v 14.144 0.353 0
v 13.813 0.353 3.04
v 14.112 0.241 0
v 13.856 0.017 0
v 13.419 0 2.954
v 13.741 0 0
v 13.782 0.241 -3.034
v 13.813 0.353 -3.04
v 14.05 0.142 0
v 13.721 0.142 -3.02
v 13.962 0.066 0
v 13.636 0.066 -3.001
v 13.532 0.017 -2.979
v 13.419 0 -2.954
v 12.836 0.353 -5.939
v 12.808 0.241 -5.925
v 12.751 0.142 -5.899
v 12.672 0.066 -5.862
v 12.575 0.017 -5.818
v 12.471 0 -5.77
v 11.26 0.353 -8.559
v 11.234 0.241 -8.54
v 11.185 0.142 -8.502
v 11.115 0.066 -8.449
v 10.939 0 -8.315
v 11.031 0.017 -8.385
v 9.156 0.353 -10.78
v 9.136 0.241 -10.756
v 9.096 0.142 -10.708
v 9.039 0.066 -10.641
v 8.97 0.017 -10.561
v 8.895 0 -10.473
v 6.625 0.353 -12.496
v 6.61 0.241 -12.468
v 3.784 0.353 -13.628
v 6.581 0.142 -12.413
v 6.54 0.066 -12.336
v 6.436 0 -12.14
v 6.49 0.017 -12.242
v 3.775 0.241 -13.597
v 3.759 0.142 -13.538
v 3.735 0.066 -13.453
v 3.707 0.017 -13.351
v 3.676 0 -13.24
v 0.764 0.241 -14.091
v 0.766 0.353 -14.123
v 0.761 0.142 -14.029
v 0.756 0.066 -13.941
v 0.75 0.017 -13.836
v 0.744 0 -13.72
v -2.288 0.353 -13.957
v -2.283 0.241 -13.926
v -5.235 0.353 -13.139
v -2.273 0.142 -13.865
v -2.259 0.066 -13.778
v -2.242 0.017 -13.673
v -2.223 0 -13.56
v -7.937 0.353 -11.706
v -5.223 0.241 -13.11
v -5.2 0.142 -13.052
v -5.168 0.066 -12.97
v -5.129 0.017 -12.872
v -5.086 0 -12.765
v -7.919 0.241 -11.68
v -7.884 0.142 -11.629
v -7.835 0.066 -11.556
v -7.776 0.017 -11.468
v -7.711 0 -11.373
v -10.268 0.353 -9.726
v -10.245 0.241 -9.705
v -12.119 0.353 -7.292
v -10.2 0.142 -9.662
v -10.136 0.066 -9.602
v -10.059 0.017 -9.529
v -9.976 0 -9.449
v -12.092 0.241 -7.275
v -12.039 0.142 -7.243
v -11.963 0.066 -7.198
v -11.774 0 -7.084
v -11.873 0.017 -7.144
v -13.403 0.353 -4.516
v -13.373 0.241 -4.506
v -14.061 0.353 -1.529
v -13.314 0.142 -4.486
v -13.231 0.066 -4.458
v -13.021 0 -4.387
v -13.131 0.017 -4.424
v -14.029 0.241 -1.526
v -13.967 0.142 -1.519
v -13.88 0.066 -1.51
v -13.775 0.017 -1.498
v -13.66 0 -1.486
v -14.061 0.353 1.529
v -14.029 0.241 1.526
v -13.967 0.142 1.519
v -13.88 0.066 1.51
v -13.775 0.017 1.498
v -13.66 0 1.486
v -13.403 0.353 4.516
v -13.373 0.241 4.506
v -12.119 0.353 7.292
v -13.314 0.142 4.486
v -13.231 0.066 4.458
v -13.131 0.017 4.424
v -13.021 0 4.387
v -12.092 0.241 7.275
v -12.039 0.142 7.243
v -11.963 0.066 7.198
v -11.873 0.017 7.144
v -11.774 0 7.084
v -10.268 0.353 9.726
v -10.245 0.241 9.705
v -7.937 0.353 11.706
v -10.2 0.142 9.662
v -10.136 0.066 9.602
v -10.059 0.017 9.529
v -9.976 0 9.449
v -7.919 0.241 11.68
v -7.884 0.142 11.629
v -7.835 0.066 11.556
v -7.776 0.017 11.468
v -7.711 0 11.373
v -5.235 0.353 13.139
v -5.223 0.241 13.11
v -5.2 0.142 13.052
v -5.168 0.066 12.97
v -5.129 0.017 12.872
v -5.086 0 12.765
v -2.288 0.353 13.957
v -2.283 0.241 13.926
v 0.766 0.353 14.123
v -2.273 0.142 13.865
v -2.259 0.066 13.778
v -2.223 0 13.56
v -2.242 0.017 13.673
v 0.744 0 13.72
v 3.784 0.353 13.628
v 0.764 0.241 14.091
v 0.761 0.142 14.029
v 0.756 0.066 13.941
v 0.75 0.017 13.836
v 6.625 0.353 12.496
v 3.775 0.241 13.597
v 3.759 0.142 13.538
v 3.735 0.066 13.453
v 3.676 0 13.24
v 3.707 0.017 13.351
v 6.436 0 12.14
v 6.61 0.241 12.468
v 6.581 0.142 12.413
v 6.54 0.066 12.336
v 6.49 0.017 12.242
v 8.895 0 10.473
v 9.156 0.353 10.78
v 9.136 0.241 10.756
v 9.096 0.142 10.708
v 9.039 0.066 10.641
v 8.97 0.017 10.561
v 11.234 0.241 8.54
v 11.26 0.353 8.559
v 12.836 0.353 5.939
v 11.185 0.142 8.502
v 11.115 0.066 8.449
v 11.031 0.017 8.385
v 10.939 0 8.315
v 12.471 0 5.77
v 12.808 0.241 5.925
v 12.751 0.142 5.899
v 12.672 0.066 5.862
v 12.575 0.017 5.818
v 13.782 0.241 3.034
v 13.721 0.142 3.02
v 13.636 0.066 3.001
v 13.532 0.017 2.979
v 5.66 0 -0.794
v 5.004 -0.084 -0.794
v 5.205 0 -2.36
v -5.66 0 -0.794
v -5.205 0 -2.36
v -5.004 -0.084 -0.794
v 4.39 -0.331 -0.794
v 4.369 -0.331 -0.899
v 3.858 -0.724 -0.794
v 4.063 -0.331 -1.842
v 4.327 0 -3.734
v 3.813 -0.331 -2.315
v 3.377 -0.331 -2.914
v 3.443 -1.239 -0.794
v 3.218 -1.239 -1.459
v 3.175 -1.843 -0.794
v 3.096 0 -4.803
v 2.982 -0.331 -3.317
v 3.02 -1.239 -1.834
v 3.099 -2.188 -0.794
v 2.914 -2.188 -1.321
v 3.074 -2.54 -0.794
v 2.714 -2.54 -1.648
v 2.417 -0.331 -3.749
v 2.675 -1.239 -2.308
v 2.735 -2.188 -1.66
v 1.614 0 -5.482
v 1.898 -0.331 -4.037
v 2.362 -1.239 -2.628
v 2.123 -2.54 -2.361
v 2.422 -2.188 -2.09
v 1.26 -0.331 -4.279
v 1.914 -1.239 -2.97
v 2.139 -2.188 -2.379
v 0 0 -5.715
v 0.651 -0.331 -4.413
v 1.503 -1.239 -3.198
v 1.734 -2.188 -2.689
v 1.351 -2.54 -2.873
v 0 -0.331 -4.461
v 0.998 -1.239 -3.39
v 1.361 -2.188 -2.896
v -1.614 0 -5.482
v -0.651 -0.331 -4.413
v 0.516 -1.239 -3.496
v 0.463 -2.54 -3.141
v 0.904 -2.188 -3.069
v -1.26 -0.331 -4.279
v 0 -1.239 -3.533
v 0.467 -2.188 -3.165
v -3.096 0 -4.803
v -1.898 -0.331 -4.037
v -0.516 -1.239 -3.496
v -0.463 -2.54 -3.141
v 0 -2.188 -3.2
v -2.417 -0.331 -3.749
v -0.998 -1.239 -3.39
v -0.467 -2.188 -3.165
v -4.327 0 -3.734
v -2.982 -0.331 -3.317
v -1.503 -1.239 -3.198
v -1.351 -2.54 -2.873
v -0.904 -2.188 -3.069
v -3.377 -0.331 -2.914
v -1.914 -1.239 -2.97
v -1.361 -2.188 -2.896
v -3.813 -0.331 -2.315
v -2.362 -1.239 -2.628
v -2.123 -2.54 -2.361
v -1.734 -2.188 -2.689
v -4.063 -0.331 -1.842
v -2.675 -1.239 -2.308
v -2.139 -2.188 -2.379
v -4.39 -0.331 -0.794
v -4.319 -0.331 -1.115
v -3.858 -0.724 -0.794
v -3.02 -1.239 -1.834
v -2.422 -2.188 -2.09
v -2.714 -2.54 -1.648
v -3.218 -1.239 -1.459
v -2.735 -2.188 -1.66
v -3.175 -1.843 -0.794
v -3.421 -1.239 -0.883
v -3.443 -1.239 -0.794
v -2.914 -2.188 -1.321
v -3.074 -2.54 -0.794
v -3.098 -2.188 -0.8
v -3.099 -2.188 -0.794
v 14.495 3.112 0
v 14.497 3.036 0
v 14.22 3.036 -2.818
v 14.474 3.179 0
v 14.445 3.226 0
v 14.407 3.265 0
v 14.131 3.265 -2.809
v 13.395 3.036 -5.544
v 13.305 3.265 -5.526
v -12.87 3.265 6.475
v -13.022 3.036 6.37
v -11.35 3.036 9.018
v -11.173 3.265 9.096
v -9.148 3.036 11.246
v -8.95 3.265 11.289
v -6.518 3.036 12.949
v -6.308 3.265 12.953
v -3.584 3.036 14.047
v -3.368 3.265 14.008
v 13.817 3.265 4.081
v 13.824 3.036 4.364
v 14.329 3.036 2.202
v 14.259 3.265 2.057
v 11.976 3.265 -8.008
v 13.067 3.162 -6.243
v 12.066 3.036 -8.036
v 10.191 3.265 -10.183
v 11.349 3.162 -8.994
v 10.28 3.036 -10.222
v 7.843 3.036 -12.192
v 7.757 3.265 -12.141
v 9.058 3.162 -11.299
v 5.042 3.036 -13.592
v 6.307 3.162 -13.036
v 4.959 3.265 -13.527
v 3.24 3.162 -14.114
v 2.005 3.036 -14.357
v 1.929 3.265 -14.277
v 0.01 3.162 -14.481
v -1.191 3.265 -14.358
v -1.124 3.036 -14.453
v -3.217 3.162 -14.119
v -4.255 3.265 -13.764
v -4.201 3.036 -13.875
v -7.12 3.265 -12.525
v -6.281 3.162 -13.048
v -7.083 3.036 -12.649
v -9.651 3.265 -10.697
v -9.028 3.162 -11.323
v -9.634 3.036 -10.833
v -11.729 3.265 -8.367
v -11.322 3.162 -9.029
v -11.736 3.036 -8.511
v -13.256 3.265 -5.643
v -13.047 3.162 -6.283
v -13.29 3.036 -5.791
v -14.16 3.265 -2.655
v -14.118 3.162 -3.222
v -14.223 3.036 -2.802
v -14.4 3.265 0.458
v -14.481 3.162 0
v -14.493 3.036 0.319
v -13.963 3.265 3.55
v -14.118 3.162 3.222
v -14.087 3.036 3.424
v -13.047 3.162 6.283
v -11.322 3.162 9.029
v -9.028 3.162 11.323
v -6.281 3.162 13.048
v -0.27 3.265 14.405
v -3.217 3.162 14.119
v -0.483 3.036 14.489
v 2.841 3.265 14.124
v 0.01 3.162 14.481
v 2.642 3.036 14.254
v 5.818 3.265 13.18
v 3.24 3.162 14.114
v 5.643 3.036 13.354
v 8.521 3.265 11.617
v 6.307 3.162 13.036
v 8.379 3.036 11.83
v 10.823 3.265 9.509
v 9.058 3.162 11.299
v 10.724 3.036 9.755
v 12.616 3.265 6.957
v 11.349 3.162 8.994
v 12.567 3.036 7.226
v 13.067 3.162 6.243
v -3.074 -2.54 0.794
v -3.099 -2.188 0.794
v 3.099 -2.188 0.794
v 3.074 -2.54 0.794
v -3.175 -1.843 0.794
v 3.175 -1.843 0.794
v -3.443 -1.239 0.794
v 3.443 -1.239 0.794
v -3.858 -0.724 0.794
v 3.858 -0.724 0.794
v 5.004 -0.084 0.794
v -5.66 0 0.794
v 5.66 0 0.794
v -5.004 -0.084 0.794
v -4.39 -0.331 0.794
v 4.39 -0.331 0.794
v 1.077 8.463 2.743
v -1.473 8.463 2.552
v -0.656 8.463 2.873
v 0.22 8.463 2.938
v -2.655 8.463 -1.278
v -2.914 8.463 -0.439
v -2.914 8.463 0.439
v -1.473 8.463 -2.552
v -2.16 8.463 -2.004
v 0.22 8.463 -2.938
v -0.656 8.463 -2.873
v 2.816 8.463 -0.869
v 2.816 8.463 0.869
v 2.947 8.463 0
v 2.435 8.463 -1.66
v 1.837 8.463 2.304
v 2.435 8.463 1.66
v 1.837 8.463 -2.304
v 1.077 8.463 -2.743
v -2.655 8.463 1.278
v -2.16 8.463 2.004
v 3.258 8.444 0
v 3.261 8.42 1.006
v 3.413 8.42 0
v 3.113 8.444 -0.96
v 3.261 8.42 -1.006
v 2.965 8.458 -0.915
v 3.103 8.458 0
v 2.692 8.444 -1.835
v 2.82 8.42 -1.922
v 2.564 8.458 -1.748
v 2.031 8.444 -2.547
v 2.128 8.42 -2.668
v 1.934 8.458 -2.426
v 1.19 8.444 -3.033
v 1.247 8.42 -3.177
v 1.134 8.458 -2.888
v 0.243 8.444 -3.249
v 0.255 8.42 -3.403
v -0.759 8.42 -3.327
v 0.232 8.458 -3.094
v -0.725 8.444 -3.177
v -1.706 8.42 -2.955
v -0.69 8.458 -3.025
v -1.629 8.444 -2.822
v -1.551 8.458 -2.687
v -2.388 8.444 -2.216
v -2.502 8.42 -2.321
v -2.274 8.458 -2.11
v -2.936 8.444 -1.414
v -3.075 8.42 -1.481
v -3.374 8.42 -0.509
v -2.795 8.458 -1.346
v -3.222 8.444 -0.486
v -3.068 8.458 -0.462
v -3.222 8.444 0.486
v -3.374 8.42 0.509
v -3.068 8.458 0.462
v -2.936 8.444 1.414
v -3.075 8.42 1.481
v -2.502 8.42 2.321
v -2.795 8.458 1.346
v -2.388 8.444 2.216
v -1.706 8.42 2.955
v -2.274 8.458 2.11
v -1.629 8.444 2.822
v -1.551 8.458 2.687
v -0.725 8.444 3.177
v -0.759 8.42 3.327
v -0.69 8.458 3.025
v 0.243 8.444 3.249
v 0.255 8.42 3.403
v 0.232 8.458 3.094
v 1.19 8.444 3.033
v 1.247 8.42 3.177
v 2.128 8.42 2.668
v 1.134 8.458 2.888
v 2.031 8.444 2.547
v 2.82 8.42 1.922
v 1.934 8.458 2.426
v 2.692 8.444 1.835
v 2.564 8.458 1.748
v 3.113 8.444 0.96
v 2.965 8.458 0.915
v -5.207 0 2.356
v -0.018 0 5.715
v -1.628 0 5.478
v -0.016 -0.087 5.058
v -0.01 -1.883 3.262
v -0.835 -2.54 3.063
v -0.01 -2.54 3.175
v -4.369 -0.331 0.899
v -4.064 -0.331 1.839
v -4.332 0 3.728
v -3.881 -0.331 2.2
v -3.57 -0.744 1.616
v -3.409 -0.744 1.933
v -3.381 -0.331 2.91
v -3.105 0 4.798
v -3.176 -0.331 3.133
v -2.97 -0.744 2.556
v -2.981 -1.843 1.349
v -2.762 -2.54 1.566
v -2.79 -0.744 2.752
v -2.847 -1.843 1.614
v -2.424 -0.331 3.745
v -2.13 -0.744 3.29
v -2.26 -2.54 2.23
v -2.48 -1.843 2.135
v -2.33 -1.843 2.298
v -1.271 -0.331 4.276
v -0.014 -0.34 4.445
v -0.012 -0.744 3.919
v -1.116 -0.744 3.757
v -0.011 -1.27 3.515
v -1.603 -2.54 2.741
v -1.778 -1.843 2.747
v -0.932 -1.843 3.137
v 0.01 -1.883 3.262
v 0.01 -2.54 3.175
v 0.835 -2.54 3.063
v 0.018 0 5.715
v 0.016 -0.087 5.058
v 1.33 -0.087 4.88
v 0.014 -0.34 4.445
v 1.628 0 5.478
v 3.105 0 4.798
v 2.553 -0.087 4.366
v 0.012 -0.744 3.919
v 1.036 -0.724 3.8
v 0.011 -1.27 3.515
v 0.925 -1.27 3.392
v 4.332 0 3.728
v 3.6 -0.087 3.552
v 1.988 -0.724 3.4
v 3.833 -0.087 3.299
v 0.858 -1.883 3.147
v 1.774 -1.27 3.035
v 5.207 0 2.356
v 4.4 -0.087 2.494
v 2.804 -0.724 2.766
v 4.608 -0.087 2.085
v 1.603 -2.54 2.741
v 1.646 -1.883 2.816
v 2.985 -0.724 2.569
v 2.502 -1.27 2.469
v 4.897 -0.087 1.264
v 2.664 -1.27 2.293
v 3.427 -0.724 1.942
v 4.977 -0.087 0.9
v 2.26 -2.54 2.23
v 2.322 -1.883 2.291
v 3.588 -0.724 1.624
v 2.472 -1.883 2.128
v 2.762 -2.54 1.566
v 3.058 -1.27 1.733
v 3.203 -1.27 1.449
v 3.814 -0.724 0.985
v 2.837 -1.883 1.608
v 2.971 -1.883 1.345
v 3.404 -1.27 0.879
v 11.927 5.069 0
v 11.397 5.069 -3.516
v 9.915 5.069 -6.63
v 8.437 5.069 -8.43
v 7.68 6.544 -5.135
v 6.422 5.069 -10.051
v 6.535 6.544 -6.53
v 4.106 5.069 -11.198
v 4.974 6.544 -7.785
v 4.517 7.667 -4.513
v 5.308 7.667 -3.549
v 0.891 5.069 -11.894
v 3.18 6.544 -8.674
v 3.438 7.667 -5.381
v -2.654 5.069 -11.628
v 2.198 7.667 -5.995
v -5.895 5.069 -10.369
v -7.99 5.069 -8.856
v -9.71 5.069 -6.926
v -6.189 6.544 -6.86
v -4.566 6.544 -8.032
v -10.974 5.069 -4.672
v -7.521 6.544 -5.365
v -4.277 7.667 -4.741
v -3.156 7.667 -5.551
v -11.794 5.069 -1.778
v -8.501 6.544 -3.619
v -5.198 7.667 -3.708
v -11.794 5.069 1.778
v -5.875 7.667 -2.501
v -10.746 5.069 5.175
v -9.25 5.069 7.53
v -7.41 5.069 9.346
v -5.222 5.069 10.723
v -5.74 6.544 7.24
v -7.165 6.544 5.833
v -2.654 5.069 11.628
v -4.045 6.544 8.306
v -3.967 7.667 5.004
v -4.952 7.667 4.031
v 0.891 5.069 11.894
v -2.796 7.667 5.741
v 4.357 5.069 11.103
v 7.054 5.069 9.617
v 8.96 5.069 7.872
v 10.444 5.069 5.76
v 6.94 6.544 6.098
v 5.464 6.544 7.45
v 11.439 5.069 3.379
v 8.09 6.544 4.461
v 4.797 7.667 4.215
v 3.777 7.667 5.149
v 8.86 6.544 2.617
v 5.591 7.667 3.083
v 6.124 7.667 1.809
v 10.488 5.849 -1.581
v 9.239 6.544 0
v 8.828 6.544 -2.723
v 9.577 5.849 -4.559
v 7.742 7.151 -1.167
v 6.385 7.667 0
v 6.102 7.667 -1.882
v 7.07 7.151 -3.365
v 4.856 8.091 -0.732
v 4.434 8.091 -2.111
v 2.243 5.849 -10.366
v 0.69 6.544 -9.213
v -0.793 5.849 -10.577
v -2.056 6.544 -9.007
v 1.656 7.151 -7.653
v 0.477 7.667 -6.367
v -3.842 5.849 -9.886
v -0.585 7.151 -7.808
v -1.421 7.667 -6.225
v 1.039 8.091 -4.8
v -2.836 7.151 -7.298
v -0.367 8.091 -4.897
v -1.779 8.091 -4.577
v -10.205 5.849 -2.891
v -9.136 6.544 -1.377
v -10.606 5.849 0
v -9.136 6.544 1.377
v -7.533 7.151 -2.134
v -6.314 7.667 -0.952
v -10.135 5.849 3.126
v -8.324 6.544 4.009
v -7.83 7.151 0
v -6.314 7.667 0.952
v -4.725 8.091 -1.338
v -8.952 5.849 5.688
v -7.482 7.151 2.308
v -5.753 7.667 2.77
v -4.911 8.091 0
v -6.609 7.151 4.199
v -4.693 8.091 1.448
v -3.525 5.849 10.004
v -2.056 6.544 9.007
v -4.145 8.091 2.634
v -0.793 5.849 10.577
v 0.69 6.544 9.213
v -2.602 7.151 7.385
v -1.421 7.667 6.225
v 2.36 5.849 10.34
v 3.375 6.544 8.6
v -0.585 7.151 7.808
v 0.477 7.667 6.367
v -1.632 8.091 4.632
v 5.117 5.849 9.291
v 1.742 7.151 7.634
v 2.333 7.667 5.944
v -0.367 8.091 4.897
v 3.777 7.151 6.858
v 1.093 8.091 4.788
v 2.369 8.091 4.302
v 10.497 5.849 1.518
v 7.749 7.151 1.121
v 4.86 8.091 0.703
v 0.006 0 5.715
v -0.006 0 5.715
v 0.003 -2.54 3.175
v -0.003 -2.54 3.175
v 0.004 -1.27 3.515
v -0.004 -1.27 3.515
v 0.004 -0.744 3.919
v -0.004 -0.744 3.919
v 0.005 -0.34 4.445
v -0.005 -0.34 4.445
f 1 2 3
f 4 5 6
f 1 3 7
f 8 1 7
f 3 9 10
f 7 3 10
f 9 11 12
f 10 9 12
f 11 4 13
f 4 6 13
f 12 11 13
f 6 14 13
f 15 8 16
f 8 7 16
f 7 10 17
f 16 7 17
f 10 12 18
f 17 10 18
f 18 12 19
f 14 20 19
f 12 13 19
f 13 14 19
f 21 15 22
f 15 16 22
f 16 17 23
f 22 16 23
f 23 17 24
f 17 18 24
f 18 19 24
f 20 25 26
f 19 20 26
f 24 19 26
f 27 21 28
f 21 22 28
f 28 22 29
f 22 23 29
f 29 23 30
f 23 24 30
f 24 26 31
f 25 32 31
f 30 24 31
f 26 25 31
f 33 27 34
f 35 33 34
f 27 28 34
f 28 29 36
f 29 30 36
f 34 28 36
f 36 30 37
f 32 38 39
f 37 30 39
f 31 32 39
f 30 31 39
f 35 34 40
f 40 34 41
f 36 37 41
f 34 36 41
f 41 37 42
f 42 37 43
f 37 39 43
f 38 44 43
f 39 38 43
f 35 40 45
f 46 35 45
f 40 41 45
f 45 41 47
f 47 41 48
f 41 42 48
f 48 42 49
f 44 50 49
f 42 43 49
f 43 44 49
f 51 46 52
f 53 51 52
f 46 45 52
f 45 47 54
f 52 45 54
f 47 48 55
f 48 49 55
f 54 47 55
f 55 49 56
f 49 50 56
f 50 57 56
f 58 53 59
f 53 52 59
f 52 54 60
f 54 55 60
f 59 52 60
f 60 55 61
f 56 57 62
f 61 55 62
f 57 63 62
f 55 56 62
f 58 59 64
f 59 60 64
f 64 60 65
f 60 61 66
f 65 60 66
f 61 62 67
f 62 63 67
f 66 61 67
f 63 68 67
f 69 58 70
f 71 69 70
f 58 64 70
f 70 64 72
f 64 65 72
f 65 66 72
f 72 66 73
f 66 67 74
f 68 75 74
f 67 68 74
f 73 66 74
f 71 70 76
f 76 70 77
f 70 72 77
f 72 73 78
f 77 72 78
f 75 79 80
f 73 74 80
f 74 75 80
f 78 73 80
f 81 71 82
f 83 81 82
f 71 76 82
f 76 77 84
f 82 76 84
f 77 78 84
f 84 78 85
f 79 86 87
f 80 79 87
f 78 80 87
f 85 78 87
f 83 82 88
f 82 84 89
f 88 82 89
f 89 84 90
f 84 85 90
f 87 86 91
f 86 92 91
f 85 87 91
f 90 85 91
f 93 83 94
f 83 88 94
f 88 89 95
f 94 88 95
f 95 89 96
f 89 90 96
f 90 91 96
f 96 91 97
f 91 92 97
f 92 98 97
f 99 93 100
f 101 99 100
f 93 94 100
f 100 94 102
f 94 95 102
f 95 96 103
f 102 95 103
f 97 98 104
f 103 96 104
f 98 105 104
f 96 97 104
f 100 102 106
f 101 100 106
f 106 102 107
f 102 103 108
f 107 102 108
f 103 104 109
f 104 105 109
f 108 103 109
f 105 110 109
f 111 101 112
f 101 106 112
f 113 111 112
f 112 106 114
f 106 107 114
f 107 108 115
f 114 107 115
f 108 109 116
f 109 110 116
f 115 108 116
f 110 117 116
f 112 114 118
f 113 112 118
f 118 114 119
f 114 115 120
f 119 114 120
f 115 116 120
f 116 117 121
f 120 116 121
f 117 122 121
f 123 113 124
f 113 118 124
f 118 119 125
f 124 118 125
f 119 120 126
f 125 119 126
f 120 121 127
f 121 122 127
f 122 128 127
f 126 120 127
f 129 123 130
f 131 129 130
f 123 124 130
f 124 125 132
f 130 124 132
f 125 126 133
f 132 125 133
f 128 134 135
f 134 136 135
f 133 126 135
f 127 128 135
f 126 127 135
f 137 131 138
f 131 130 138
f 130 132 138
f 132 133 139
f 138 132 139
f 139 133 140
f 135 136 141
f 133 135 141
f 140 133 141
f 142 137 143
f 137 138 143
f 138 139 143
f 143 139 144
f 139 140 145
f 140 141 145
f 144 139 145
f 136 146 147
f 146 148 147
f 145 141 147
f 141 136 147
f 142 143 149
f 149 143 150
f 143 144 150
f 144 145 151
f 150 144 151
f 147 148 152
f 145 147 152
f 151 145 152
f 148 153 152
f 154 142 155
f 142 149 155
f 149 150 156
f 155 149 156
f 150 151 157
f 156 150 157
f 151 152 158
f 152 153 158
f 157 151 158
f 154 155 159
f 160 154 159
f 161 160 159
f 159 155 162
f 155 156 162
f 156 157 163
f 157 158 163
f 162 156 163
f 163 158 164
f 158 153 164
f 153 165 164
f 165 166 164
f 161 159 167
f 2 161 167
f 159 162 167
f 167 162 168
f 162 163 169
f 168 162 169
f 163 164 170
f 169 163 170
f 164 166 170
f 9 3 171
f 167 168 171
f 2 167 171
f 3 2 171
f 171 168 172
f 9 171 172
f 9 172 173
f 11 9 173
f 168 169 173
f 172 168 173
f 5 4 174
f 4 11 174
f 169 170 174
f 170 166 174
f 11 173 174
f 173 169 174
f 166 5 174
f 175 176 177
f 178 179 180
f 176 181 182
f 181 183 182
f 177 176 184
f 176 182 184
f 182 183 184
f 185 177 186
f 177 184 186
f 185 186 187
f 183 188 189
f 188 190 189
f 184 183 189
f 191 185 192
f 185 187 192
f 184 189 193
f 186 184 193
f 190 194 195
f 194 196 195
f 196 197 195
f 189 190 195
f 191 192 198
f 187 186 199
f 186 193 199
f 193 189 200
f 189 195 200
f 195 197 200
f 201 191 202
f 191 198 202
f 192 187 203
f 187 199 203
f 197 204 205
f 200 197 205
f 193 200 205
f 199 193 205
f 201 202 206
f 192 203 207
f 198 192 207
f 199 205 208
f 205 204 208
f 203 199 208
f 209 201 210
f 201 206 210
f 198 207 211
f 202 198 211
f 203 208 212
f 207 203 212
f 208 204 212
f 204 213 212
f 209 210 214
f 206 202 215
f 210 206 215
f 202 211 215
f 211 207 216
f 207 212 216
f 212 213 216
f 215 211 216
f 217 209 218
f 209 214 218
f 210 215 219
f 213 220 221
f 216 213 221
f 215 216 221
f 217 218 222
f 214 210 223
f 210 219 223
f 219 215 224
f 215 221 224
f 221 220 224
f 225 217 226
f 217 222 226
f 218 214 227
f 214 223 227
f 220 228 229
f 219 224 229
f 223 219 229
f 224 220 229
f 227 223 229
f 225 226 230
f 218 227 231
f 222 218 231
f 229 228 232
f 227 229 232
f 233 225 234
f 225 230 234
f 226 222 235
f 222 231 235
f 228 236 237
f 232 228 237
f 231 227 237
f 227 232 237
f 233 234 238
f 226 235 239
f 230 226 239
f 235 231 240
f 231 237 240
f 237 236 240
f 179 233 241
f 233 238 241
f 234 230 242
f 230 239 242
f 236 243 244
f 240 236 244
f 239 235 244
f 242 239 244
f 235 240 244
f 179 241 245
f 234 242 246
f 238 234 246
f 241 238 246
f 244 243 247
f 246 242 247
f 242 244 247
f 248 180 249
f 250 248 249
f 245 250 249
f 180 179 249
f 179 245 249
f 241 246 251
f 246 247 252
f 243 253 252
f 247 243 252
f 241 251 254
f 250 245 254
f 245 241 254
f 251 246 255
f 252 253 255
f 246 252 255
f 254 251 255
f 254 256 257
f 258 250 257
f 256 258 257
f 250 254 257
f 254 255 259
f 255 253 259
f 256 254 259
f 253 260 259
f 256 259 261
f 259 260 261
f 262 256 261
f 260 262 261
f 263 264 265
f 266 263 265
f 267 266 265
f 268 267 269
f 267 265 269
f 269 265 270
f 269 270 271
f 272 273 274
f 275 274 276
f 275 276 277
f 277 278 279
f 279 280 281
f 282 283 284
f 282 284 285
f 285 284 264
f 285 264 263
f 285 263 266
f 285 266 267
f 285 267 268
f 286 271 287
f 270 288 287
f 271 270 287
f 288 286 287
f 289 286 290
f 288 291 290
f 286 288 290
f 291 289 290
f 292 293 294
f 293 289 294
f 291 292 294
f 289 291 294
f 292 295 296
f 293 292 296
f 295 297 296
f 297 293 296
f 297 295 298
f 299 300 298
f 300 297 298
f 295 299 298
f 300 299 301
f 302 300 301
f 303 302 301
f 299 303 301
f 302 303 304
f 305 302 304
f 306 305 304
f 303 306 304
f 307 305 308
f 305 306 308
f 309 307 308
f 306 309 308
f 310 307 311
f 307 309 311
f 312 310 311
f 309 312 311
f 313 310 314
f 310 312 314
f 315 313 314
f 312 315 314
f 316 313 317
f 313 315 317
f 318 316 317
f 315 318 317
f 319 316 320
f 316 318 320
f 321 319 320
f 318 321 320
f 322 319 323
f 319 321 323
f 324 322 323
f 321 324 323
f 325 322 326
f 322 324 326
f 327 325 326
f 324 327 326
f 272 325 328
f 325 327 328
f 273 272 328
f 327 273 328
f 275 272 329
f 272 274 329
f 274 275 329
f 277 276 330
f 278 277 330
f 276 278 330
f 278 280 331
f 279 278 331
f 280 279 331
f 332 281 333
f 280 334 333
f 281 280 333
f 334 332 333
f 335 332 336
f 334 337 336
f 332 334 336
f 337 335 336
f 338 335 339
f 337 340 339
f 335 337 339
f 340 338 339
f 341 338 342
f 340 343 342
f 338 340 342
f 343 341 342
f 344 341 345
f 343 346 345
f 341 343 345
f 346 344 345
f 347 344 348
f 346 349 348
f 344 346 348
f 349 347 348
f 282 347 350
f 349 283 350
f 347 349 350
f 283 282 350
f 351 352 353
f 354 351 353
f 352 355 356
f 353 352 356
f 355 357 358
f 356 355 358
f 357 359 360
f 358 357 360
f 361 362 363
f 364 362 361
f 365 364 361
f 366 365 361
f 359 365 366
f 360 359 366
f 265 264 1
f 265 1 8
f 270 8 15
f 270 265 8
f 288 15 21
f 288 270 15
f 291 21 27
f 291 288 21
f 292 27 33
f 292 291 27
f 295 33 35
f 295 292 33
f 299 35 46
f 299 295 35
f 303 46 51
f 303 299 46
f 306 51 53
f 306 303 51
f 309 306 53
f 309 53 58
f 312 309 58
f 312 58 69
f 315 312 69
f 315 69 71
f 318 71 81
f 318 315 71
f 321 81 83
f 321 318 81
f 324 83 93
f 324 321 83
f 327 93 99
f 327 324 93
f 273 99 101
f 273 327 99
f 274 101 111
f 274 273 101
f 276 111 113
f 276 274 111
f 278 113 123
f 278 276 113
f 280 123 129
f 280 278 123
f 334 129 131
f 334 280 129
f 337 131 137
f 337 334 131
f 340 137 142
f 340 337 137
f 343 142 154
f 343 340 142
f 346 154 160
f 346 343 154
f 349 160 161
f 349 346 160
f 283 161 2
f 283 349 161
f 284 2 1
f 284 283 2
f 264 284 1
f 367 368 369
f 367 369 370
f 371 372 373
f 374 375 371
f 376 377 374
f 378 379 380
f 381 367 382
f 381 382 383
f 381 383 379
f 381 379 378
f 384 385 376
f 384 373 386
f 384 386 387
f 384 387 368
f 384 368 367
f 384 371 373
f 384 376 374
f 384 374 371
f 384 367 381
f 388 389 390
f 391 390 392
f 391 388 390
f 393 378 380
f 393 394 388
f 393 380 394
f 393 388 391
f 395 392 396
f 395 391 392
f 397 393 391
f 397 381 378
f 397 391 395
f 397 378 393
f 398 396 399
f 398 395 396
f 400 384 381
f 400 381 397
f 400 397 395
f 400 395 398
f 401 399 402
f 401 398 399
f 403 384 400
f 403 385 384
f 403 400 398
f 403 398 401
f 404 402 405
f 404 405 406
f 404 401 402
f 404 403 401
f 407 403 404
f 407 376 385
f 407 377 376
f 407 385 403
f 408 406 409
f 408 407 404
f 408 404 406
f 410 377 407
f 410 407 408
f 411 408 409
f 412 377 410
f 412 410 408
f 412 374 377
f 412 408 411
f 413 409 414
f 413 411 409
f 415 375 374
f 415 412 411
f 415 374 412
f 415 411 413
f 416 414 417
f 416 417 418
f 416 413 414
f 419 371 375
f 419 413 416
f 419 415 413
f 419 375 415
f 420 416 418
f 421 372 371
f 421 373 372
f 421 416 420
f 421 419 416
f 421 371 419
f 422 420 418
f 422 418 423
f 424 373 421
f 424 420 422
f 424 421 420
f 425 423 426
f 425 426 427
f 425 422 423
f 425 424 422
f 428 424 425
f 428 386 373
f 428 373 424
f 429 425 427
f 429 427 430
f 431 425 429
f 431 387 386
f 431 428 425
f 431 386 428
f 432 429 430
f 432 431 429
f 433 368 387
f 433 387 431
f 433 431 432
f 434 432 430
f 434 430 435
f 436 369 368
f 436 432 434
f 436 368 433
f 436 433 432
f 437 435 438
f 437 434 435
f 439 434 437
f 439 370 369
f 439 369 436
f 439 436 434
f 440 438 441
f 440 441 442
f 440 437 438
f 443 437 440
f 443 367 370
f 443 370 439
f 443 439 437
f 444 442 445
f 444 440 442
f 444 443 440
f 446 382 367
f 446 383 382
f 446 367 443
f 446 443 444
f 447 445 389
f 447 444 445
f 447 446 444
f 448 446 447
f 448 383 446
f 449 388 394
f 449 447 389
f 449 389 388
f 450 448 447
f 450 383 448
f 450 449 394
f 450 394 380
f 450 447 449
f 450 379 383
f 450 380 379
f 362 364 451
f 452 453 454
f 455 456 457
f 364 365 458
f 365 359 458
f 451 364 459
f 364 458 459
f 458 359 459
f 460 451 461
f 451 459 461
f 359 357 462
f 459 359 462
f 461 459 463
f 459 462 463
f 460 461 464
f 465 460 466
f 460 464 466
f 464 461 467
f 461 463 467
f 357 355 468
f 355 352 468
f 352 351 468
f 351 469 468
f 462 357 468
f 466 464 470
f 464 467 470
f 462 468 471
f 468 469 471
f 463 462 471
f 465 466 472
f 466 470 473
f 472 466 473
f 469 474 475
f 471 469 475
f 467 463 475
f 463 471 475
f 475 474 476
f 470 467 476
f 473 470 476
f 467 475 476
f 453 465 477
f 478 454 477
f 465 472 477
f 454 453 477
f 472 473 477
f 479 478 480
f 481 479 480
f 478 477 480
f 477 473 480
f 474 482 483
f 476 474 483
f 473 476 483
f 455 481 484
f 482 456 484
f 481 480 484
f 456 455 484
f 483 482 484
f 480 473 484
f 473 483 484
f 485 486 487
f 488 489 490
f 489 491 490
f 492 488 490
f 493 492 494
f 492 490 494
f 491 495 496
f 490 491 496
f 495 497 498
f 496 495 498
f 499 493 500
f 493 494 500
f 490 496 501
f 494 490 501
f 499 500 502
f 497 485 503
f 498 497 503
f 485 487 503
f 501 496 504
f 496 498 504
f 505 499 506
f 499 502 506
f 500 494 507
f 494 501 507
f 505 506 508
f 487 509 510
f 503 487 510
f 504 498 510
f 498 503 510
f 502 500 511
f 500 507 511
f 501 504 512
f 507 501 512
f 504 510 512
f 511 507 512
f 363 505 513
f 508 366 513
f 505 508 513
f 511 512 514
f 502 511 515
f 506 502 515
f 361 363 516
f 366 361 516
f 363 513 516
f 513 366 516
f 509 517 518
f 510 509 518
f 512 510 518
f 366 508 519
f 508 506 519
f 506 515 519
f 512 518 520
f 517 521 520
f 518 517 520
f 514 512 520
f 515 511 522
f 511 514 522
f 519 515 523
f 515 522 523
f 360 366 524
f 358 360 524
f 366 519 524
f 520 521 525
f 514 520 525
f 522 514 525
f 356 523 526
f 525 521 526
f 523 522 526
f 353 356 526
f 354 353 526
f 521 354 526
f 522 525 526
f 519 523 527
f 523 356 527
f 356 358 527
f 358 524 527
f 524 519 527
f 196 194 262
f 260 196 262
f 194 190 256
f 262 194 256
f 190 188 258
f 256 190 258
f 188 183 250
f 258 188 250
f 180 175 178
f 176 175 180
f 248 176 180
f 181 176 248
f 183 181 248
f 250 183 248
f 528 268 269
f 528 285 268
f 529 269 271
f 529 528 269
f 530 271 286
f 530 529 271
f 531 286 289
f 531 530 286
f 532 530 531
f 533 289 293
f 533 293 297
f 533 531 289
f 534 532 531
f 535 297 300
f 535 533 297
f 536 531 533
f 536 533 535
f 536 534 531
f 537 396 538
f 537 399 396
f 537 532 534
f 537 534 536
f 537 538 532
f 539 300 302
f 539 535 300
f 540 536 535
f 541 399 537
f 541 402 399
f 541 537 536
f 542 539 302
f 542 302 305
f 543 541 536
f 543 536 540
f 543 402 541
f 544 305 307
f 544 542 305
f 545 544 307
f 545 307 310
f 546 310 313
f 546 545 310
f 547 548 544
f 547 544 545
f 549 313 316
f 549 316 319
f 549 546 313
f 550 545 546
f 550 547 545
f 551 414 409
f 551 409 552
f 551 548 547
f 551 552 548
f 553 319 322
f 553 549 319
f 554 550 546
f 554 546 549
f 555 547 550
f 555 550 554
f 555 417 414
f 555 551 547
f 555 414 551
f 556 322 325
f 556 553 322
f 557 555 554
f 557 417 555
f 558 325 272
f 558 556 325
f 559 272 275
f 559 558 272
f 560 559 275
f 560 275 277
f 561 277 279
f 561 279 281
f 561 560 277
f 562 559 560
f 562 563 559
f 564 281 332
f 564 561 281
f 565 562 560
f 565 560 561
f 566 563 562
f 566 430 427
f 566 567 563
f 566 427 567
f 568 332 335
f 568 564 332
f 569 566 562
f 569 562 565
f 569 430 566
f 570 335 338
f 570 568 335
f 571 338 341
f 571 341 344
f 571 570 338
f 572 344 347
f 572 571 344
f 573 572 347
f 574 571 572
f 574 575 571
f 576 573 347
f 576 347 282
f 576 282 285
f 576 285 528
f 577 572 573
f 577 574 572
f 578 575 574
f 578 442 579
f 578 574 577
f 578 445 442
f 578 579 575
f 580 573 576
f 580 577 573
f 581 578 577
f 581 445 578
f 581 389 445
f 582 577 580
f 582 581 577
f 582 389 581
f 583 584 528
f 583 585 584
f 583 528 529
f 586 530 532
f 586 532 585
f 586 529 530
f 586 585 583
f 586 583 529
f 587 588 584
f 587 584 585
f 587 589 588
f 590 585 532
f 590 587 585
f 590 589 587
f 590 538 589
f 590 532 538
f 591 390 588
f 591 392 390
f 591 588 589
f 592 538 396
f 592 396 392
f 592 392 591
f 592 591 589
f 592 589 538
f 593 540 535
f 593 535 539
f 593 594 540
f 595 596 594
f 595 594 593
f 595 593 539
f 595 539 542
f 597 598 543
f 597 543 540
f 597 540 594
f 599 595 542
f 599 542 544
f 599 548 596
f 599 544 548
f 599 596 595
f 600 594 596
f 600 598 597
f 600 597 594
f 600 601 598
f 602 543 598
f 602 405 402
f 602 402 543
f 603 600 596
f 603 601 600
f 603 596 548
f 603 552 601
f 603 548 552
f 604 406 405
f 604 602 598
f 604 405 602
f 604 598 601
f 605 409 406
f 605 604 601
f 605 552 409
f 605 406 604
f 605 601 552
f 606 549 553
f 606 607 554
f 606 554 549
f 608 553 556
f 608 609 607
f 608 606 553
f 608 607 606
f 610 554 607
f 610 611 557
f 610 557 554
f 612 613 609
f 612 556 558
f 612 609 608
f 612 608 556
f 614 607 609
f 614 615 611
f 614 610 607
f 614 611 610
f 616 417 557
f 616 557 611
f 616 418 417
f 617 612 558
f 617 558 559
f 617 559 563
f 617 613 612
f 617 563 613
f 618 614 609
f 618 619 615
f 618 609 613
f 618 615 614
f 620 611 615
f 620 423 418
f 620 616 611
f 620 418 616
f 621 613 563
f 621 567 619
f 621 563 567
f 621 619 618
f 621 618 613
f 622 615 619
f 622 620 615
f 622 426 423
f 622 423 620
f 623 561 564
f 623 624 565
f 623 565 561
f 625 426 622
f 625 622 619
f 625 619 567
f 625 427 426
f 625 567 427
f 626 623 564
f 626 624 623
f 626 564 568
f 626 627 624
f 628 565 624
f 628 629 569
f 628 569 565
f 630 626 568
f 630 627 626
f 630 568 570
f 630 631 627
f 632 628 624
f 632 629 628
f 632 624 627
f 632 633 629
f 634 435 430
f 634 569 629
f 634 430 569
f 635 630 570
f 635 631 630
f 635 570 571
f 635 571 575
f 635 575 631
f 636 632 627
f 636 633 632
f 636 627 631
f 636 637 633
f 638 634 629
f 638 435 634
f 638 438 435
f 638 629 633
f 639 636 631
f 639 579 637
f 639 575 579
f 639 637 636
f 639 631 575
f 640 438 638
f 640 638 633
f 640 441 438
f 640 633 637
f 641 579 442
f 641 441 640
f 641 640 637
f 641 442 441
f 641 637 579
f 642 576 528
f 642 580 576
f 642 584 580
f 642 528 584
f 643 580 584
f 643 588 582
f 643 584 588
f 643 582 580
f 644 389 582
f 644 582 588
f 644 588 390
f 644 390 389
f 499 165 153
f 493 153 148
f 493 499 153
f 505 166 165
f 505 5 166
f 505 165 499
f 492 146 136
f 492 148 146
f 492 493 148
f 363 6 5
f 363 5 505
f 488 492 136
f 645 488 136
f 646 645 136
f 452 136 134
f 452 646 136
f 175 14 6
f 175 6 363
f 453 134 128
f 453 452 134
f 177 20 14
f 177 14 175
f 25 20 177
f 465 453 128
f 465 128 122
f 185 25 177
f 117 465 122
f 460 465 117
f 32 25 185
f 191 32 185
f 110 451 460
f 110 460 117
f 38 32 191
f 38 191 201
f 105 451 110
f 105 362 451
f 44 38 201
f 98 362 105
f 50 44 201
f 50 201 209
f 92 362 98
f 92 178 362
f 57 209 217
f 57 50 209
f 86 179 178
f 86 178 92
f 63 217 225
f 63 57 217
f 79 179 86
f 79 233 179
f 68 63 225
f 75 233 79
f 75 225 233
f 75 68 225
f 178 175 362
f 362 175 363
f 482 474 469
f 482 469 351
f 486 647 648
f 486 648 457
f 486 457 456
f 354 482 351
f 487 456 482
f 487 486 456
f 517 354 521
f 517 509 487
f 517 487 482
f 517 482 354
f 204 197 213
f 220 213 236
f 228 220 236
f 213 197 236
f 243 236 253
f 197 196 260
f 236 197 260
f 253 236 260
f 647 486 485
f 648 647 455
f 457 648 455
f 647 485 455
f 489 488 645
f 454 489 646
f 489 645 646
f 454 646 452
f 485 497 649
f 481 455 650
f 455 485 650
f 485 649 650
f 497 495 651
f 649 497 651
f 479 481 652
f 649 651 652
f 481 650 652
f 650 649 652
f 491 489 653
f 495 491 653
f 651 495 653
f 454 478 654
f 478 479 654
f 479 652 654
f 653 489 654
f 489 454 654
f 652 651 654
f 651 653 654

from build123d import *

# Parameters (mm, degrees)
BOSS_EXTRUDE1_DEPTH = 2.54
BOTTOM_TOP_ROUNDS_R = 2.54
SIDE_ROUND_R        = 0.254
MATCH_TOOL_RADIUS_R = 0.4064


with BuildPart() as part:
    # Sketch2 → Revolve1 (revolve)
    with BuildSketch(Plane.XY):
        with BuildLine():
            Line((0, 0), (14.097, 0))
            Line((14.097, 0), (14.51499668, 3.175))
            ThreePointArc((14.51499668, 3.175), (9.193082758, 6.56543309), (3.175, 8.462927295))
            Line((3.175, 8.462927295), (0, 8.462927295))
            Line((0, 8.462927295), (0, 0))
        make_face()
    revolve(axis=Axis((0, 0, 0), (0, 1, 0)))

    # Sketch3 → Boss-Extrude1 (add)
    with BuildSketch(Plane.XZ):
        with BuildLine():
            Line((-3.074180531, 0.79375), (3.074180531, 0.79375))
            ThreePointArc((3.074180531, 0.79375), (0, 3.175), (-3.074180531, 0.79375))
        make_face()
        with BuildLine():
            Line((-3.074180531, -0.79375), (3.074180531, -0.79375))
            ThreePointArc((3.074180531, -0.79375), (0, -3.175), (-3.074180531, -0.79375))
        make_face()
    extrude(amount=BOSS_EXTRUDE1_DEPTH)

    # Bottom/Top Rounds
    # the kernel refuses this fillet: 2.54 mm, written as the material it adds along each edge
    with BuildSketch(Plane(origin=(0, 0, 0), x_dir=(0.0031415874858799556, 0, 0.9999950652018581), z_dir=(-0.9999950652018581, 0, 0.0031415874858799556))) as bottom_top_rounds_piece_1_section:
        with BuildLine():
            CenterArc((3.175 + BOTTOM_TOP_ROUNDS_R, -BOTTOM_TOP_ROUNDS_R), BOTTOM_TOP_ROUNDS_R, 90, 90)
            Line((3.175, -BOTTOM_TOP_ROUNDS_R), (3.175, 0))
            Line((3.175, 0), (3.175 + BOTTOM_TOP_ROUNDS_R, 0))
        make_face()
    bottom_top_rounds_piece_1 = revolve(axis=Axis((0, 0, 0), (0, 1, 0)), revolution_arc=359.64, mode=Mode.PRIVATE)
    bottom_top_rounds_piece_1 = split(bottom_top_rounds_piece_1, bisect_by=Plane(origin=(2.222683087, -0.525983554, 0.79375), z_dir=(0, 0, 1)), keep=Keep.TOP, mode=Mode.PRIVATE)
    add(bottom_top_rounds_piece_1)
    with BuildSketch(Plane(origin=(0, 0, 0), x_dir=(0.0031415874858799556, 0, 0.9999950652018581), z_dir=(-0.9999950652018581, 0, 0.0031415874858799556))) as bottom_top_rounds_piece_2_section:
        with BuildLine():
            CenterArc((3.175 + BOTTOM_TOP_ROUNDS_R, -BOTTOM_TOP_ROUNDS_R), BOTTOM_TOP_ROUNDS_R, 90, 90)
            Line((3.175, -BOTTOM_TOP_ROUNDS_R), (3.175, 0))
            Line((3.175, 0), (3.175 + BOTTOM_TOP_ROUNDS_R, 0))
        make_face()
    bottom_top_rounds_piece_2 = revolve(axis=Axis((0, 0, 0), (0, 1, 0)), revolution_arc=359.64, mode=Mode.PRIVATE)
    bottom_top_rounds_piece_2 = split(bottom_top_rounds_piece_2, bisect_by=Plane(origin=(0, -0.726881266, -0.79375), z_dir=(0, 0, -1)), keep=Keep.TOP, mode=Mode.PRIVATE)
    add(bottom_top_rounds_piece_2)
    with BuildSketch(Plane(origin=(0, 0, 0), x_dir=(0.0031415874858799556, 0, -0.9999950652018581), z_dir=(-0.9999950652018581, 0, -0.0031415874858799556))) as bottom_top_rounds_piece_3_section:
        with BuildLine():
            CenterArc((3.175 + BOTTOM_TOP_ROUNDS_R, BOTTOM_TOP_ROUNDS_R), BOTTOM_TOP_ROUNDS_R, 180, 90)
            Line((3.175, BOTTOM_TOP_ROUNDS_R), (3.175, 0))
            Line((3.175, 0), (3.175 + BOTTOM_TOP_ROUNDS_R, 0))
        make_face()
    bottom_top_rounds_piece_3 = revolve(axis=Axis((0, 0, 0), (0, -1, 0)), revolution_arc=359.64, mode=Mode.PRIVATE)
    bottom_top_rounds_piece_3 = split(bottom_top_rounds_piece_3, bisect_by=Plane(origin=(2.222683087, -0.525983554, -0.79375), z_dir=(0, 0, -1)), keep=Keep.TOP, mode=Mode.PRIVATE)
    add(bottom_top_rounds_piece_3)
    with BuildSketch(Plane(origin=(0, 0, 0), x_dir=(0.0031415874858799556, 0, -0.9999950652018581), z_dir=(-0.9999950652018581, 0, -0.0031415874858799556))) as bottom_top_rounds_piece_4_section:
        with BuildLine():
            CenterArc((3.175 + BOTTOM_TOP_ROUNDS_R, BOTTOM_TOP_ROUNDS_R), BOTTOM_TOP_ROUNDS_R, 180, 90)
            Line((3.175, BOTTOM_TOP_ROUNDS_R), (3.175, 0))
            Line((3.175, 0), (3.175 + BOTTOM_TOP_ROUNDS_R, 0))
        make_face()
    bottom_top_rounds_piece_4 = revolve(axis=Axis((0, 0, 0), (0, -1, 0)), revolution_arc=359.64, mode=Mode.PRIVATE)
    bottom_top_rounds_piece_4 = split(bottom_top_rounds_piece_4, bisect_by=Plane(origin=(0, -0.726881266, 0.79375), z_dir=(0, 0, 1)), keep=Keep.TOP, mode=Mode.PRIVATE)
    add(bottom_top_rounds_piece_4)
    # the kernel refuses this fillet: 2.54 mm, written as the material it takes off along each edge
    with BuildSketch(Plane(origin=(0, 8.462927295, 0), x_dir=(1, 0, 0), z_dir=(0, 0, 1))) as bottom_top_rounds_2_piece_1:
        with BuildLine():
            CenterArc((2.946562621, -2.54), BOTTOM_TOP_ROUNDS_R, 79.427614444, 10.572385556)
            ThreePointArc((3.412595702, -0.043119312), (3.293851696, -0.021262958), (3.175, 0))
            Line((3.175, 0), (2.946562621, 0))
        make_face()
    revolve(axis=Axis((0, 8.462927295, 0), (0, 1, 0)), mode=Mode.SUBTRACT)

    # Side Round
    side_round_edges = [part.edges().sort_by_distance(p)[0] for p in [
        (-14.51499668, 3.175, 0),
    ]]
    fillet(side_round_edges, radius=SIDE_ROUND_R)

    # Match Tool Radius
    match_tool_radius_edges = [part.edges().sort_by_distance(p)[0] for p in [
        (-14.097, 0, 0),
    ]]
    fillet(match_tool_radius_edges, radius=MATCH_TOOL_RADIUS_R)


solid = part.part
